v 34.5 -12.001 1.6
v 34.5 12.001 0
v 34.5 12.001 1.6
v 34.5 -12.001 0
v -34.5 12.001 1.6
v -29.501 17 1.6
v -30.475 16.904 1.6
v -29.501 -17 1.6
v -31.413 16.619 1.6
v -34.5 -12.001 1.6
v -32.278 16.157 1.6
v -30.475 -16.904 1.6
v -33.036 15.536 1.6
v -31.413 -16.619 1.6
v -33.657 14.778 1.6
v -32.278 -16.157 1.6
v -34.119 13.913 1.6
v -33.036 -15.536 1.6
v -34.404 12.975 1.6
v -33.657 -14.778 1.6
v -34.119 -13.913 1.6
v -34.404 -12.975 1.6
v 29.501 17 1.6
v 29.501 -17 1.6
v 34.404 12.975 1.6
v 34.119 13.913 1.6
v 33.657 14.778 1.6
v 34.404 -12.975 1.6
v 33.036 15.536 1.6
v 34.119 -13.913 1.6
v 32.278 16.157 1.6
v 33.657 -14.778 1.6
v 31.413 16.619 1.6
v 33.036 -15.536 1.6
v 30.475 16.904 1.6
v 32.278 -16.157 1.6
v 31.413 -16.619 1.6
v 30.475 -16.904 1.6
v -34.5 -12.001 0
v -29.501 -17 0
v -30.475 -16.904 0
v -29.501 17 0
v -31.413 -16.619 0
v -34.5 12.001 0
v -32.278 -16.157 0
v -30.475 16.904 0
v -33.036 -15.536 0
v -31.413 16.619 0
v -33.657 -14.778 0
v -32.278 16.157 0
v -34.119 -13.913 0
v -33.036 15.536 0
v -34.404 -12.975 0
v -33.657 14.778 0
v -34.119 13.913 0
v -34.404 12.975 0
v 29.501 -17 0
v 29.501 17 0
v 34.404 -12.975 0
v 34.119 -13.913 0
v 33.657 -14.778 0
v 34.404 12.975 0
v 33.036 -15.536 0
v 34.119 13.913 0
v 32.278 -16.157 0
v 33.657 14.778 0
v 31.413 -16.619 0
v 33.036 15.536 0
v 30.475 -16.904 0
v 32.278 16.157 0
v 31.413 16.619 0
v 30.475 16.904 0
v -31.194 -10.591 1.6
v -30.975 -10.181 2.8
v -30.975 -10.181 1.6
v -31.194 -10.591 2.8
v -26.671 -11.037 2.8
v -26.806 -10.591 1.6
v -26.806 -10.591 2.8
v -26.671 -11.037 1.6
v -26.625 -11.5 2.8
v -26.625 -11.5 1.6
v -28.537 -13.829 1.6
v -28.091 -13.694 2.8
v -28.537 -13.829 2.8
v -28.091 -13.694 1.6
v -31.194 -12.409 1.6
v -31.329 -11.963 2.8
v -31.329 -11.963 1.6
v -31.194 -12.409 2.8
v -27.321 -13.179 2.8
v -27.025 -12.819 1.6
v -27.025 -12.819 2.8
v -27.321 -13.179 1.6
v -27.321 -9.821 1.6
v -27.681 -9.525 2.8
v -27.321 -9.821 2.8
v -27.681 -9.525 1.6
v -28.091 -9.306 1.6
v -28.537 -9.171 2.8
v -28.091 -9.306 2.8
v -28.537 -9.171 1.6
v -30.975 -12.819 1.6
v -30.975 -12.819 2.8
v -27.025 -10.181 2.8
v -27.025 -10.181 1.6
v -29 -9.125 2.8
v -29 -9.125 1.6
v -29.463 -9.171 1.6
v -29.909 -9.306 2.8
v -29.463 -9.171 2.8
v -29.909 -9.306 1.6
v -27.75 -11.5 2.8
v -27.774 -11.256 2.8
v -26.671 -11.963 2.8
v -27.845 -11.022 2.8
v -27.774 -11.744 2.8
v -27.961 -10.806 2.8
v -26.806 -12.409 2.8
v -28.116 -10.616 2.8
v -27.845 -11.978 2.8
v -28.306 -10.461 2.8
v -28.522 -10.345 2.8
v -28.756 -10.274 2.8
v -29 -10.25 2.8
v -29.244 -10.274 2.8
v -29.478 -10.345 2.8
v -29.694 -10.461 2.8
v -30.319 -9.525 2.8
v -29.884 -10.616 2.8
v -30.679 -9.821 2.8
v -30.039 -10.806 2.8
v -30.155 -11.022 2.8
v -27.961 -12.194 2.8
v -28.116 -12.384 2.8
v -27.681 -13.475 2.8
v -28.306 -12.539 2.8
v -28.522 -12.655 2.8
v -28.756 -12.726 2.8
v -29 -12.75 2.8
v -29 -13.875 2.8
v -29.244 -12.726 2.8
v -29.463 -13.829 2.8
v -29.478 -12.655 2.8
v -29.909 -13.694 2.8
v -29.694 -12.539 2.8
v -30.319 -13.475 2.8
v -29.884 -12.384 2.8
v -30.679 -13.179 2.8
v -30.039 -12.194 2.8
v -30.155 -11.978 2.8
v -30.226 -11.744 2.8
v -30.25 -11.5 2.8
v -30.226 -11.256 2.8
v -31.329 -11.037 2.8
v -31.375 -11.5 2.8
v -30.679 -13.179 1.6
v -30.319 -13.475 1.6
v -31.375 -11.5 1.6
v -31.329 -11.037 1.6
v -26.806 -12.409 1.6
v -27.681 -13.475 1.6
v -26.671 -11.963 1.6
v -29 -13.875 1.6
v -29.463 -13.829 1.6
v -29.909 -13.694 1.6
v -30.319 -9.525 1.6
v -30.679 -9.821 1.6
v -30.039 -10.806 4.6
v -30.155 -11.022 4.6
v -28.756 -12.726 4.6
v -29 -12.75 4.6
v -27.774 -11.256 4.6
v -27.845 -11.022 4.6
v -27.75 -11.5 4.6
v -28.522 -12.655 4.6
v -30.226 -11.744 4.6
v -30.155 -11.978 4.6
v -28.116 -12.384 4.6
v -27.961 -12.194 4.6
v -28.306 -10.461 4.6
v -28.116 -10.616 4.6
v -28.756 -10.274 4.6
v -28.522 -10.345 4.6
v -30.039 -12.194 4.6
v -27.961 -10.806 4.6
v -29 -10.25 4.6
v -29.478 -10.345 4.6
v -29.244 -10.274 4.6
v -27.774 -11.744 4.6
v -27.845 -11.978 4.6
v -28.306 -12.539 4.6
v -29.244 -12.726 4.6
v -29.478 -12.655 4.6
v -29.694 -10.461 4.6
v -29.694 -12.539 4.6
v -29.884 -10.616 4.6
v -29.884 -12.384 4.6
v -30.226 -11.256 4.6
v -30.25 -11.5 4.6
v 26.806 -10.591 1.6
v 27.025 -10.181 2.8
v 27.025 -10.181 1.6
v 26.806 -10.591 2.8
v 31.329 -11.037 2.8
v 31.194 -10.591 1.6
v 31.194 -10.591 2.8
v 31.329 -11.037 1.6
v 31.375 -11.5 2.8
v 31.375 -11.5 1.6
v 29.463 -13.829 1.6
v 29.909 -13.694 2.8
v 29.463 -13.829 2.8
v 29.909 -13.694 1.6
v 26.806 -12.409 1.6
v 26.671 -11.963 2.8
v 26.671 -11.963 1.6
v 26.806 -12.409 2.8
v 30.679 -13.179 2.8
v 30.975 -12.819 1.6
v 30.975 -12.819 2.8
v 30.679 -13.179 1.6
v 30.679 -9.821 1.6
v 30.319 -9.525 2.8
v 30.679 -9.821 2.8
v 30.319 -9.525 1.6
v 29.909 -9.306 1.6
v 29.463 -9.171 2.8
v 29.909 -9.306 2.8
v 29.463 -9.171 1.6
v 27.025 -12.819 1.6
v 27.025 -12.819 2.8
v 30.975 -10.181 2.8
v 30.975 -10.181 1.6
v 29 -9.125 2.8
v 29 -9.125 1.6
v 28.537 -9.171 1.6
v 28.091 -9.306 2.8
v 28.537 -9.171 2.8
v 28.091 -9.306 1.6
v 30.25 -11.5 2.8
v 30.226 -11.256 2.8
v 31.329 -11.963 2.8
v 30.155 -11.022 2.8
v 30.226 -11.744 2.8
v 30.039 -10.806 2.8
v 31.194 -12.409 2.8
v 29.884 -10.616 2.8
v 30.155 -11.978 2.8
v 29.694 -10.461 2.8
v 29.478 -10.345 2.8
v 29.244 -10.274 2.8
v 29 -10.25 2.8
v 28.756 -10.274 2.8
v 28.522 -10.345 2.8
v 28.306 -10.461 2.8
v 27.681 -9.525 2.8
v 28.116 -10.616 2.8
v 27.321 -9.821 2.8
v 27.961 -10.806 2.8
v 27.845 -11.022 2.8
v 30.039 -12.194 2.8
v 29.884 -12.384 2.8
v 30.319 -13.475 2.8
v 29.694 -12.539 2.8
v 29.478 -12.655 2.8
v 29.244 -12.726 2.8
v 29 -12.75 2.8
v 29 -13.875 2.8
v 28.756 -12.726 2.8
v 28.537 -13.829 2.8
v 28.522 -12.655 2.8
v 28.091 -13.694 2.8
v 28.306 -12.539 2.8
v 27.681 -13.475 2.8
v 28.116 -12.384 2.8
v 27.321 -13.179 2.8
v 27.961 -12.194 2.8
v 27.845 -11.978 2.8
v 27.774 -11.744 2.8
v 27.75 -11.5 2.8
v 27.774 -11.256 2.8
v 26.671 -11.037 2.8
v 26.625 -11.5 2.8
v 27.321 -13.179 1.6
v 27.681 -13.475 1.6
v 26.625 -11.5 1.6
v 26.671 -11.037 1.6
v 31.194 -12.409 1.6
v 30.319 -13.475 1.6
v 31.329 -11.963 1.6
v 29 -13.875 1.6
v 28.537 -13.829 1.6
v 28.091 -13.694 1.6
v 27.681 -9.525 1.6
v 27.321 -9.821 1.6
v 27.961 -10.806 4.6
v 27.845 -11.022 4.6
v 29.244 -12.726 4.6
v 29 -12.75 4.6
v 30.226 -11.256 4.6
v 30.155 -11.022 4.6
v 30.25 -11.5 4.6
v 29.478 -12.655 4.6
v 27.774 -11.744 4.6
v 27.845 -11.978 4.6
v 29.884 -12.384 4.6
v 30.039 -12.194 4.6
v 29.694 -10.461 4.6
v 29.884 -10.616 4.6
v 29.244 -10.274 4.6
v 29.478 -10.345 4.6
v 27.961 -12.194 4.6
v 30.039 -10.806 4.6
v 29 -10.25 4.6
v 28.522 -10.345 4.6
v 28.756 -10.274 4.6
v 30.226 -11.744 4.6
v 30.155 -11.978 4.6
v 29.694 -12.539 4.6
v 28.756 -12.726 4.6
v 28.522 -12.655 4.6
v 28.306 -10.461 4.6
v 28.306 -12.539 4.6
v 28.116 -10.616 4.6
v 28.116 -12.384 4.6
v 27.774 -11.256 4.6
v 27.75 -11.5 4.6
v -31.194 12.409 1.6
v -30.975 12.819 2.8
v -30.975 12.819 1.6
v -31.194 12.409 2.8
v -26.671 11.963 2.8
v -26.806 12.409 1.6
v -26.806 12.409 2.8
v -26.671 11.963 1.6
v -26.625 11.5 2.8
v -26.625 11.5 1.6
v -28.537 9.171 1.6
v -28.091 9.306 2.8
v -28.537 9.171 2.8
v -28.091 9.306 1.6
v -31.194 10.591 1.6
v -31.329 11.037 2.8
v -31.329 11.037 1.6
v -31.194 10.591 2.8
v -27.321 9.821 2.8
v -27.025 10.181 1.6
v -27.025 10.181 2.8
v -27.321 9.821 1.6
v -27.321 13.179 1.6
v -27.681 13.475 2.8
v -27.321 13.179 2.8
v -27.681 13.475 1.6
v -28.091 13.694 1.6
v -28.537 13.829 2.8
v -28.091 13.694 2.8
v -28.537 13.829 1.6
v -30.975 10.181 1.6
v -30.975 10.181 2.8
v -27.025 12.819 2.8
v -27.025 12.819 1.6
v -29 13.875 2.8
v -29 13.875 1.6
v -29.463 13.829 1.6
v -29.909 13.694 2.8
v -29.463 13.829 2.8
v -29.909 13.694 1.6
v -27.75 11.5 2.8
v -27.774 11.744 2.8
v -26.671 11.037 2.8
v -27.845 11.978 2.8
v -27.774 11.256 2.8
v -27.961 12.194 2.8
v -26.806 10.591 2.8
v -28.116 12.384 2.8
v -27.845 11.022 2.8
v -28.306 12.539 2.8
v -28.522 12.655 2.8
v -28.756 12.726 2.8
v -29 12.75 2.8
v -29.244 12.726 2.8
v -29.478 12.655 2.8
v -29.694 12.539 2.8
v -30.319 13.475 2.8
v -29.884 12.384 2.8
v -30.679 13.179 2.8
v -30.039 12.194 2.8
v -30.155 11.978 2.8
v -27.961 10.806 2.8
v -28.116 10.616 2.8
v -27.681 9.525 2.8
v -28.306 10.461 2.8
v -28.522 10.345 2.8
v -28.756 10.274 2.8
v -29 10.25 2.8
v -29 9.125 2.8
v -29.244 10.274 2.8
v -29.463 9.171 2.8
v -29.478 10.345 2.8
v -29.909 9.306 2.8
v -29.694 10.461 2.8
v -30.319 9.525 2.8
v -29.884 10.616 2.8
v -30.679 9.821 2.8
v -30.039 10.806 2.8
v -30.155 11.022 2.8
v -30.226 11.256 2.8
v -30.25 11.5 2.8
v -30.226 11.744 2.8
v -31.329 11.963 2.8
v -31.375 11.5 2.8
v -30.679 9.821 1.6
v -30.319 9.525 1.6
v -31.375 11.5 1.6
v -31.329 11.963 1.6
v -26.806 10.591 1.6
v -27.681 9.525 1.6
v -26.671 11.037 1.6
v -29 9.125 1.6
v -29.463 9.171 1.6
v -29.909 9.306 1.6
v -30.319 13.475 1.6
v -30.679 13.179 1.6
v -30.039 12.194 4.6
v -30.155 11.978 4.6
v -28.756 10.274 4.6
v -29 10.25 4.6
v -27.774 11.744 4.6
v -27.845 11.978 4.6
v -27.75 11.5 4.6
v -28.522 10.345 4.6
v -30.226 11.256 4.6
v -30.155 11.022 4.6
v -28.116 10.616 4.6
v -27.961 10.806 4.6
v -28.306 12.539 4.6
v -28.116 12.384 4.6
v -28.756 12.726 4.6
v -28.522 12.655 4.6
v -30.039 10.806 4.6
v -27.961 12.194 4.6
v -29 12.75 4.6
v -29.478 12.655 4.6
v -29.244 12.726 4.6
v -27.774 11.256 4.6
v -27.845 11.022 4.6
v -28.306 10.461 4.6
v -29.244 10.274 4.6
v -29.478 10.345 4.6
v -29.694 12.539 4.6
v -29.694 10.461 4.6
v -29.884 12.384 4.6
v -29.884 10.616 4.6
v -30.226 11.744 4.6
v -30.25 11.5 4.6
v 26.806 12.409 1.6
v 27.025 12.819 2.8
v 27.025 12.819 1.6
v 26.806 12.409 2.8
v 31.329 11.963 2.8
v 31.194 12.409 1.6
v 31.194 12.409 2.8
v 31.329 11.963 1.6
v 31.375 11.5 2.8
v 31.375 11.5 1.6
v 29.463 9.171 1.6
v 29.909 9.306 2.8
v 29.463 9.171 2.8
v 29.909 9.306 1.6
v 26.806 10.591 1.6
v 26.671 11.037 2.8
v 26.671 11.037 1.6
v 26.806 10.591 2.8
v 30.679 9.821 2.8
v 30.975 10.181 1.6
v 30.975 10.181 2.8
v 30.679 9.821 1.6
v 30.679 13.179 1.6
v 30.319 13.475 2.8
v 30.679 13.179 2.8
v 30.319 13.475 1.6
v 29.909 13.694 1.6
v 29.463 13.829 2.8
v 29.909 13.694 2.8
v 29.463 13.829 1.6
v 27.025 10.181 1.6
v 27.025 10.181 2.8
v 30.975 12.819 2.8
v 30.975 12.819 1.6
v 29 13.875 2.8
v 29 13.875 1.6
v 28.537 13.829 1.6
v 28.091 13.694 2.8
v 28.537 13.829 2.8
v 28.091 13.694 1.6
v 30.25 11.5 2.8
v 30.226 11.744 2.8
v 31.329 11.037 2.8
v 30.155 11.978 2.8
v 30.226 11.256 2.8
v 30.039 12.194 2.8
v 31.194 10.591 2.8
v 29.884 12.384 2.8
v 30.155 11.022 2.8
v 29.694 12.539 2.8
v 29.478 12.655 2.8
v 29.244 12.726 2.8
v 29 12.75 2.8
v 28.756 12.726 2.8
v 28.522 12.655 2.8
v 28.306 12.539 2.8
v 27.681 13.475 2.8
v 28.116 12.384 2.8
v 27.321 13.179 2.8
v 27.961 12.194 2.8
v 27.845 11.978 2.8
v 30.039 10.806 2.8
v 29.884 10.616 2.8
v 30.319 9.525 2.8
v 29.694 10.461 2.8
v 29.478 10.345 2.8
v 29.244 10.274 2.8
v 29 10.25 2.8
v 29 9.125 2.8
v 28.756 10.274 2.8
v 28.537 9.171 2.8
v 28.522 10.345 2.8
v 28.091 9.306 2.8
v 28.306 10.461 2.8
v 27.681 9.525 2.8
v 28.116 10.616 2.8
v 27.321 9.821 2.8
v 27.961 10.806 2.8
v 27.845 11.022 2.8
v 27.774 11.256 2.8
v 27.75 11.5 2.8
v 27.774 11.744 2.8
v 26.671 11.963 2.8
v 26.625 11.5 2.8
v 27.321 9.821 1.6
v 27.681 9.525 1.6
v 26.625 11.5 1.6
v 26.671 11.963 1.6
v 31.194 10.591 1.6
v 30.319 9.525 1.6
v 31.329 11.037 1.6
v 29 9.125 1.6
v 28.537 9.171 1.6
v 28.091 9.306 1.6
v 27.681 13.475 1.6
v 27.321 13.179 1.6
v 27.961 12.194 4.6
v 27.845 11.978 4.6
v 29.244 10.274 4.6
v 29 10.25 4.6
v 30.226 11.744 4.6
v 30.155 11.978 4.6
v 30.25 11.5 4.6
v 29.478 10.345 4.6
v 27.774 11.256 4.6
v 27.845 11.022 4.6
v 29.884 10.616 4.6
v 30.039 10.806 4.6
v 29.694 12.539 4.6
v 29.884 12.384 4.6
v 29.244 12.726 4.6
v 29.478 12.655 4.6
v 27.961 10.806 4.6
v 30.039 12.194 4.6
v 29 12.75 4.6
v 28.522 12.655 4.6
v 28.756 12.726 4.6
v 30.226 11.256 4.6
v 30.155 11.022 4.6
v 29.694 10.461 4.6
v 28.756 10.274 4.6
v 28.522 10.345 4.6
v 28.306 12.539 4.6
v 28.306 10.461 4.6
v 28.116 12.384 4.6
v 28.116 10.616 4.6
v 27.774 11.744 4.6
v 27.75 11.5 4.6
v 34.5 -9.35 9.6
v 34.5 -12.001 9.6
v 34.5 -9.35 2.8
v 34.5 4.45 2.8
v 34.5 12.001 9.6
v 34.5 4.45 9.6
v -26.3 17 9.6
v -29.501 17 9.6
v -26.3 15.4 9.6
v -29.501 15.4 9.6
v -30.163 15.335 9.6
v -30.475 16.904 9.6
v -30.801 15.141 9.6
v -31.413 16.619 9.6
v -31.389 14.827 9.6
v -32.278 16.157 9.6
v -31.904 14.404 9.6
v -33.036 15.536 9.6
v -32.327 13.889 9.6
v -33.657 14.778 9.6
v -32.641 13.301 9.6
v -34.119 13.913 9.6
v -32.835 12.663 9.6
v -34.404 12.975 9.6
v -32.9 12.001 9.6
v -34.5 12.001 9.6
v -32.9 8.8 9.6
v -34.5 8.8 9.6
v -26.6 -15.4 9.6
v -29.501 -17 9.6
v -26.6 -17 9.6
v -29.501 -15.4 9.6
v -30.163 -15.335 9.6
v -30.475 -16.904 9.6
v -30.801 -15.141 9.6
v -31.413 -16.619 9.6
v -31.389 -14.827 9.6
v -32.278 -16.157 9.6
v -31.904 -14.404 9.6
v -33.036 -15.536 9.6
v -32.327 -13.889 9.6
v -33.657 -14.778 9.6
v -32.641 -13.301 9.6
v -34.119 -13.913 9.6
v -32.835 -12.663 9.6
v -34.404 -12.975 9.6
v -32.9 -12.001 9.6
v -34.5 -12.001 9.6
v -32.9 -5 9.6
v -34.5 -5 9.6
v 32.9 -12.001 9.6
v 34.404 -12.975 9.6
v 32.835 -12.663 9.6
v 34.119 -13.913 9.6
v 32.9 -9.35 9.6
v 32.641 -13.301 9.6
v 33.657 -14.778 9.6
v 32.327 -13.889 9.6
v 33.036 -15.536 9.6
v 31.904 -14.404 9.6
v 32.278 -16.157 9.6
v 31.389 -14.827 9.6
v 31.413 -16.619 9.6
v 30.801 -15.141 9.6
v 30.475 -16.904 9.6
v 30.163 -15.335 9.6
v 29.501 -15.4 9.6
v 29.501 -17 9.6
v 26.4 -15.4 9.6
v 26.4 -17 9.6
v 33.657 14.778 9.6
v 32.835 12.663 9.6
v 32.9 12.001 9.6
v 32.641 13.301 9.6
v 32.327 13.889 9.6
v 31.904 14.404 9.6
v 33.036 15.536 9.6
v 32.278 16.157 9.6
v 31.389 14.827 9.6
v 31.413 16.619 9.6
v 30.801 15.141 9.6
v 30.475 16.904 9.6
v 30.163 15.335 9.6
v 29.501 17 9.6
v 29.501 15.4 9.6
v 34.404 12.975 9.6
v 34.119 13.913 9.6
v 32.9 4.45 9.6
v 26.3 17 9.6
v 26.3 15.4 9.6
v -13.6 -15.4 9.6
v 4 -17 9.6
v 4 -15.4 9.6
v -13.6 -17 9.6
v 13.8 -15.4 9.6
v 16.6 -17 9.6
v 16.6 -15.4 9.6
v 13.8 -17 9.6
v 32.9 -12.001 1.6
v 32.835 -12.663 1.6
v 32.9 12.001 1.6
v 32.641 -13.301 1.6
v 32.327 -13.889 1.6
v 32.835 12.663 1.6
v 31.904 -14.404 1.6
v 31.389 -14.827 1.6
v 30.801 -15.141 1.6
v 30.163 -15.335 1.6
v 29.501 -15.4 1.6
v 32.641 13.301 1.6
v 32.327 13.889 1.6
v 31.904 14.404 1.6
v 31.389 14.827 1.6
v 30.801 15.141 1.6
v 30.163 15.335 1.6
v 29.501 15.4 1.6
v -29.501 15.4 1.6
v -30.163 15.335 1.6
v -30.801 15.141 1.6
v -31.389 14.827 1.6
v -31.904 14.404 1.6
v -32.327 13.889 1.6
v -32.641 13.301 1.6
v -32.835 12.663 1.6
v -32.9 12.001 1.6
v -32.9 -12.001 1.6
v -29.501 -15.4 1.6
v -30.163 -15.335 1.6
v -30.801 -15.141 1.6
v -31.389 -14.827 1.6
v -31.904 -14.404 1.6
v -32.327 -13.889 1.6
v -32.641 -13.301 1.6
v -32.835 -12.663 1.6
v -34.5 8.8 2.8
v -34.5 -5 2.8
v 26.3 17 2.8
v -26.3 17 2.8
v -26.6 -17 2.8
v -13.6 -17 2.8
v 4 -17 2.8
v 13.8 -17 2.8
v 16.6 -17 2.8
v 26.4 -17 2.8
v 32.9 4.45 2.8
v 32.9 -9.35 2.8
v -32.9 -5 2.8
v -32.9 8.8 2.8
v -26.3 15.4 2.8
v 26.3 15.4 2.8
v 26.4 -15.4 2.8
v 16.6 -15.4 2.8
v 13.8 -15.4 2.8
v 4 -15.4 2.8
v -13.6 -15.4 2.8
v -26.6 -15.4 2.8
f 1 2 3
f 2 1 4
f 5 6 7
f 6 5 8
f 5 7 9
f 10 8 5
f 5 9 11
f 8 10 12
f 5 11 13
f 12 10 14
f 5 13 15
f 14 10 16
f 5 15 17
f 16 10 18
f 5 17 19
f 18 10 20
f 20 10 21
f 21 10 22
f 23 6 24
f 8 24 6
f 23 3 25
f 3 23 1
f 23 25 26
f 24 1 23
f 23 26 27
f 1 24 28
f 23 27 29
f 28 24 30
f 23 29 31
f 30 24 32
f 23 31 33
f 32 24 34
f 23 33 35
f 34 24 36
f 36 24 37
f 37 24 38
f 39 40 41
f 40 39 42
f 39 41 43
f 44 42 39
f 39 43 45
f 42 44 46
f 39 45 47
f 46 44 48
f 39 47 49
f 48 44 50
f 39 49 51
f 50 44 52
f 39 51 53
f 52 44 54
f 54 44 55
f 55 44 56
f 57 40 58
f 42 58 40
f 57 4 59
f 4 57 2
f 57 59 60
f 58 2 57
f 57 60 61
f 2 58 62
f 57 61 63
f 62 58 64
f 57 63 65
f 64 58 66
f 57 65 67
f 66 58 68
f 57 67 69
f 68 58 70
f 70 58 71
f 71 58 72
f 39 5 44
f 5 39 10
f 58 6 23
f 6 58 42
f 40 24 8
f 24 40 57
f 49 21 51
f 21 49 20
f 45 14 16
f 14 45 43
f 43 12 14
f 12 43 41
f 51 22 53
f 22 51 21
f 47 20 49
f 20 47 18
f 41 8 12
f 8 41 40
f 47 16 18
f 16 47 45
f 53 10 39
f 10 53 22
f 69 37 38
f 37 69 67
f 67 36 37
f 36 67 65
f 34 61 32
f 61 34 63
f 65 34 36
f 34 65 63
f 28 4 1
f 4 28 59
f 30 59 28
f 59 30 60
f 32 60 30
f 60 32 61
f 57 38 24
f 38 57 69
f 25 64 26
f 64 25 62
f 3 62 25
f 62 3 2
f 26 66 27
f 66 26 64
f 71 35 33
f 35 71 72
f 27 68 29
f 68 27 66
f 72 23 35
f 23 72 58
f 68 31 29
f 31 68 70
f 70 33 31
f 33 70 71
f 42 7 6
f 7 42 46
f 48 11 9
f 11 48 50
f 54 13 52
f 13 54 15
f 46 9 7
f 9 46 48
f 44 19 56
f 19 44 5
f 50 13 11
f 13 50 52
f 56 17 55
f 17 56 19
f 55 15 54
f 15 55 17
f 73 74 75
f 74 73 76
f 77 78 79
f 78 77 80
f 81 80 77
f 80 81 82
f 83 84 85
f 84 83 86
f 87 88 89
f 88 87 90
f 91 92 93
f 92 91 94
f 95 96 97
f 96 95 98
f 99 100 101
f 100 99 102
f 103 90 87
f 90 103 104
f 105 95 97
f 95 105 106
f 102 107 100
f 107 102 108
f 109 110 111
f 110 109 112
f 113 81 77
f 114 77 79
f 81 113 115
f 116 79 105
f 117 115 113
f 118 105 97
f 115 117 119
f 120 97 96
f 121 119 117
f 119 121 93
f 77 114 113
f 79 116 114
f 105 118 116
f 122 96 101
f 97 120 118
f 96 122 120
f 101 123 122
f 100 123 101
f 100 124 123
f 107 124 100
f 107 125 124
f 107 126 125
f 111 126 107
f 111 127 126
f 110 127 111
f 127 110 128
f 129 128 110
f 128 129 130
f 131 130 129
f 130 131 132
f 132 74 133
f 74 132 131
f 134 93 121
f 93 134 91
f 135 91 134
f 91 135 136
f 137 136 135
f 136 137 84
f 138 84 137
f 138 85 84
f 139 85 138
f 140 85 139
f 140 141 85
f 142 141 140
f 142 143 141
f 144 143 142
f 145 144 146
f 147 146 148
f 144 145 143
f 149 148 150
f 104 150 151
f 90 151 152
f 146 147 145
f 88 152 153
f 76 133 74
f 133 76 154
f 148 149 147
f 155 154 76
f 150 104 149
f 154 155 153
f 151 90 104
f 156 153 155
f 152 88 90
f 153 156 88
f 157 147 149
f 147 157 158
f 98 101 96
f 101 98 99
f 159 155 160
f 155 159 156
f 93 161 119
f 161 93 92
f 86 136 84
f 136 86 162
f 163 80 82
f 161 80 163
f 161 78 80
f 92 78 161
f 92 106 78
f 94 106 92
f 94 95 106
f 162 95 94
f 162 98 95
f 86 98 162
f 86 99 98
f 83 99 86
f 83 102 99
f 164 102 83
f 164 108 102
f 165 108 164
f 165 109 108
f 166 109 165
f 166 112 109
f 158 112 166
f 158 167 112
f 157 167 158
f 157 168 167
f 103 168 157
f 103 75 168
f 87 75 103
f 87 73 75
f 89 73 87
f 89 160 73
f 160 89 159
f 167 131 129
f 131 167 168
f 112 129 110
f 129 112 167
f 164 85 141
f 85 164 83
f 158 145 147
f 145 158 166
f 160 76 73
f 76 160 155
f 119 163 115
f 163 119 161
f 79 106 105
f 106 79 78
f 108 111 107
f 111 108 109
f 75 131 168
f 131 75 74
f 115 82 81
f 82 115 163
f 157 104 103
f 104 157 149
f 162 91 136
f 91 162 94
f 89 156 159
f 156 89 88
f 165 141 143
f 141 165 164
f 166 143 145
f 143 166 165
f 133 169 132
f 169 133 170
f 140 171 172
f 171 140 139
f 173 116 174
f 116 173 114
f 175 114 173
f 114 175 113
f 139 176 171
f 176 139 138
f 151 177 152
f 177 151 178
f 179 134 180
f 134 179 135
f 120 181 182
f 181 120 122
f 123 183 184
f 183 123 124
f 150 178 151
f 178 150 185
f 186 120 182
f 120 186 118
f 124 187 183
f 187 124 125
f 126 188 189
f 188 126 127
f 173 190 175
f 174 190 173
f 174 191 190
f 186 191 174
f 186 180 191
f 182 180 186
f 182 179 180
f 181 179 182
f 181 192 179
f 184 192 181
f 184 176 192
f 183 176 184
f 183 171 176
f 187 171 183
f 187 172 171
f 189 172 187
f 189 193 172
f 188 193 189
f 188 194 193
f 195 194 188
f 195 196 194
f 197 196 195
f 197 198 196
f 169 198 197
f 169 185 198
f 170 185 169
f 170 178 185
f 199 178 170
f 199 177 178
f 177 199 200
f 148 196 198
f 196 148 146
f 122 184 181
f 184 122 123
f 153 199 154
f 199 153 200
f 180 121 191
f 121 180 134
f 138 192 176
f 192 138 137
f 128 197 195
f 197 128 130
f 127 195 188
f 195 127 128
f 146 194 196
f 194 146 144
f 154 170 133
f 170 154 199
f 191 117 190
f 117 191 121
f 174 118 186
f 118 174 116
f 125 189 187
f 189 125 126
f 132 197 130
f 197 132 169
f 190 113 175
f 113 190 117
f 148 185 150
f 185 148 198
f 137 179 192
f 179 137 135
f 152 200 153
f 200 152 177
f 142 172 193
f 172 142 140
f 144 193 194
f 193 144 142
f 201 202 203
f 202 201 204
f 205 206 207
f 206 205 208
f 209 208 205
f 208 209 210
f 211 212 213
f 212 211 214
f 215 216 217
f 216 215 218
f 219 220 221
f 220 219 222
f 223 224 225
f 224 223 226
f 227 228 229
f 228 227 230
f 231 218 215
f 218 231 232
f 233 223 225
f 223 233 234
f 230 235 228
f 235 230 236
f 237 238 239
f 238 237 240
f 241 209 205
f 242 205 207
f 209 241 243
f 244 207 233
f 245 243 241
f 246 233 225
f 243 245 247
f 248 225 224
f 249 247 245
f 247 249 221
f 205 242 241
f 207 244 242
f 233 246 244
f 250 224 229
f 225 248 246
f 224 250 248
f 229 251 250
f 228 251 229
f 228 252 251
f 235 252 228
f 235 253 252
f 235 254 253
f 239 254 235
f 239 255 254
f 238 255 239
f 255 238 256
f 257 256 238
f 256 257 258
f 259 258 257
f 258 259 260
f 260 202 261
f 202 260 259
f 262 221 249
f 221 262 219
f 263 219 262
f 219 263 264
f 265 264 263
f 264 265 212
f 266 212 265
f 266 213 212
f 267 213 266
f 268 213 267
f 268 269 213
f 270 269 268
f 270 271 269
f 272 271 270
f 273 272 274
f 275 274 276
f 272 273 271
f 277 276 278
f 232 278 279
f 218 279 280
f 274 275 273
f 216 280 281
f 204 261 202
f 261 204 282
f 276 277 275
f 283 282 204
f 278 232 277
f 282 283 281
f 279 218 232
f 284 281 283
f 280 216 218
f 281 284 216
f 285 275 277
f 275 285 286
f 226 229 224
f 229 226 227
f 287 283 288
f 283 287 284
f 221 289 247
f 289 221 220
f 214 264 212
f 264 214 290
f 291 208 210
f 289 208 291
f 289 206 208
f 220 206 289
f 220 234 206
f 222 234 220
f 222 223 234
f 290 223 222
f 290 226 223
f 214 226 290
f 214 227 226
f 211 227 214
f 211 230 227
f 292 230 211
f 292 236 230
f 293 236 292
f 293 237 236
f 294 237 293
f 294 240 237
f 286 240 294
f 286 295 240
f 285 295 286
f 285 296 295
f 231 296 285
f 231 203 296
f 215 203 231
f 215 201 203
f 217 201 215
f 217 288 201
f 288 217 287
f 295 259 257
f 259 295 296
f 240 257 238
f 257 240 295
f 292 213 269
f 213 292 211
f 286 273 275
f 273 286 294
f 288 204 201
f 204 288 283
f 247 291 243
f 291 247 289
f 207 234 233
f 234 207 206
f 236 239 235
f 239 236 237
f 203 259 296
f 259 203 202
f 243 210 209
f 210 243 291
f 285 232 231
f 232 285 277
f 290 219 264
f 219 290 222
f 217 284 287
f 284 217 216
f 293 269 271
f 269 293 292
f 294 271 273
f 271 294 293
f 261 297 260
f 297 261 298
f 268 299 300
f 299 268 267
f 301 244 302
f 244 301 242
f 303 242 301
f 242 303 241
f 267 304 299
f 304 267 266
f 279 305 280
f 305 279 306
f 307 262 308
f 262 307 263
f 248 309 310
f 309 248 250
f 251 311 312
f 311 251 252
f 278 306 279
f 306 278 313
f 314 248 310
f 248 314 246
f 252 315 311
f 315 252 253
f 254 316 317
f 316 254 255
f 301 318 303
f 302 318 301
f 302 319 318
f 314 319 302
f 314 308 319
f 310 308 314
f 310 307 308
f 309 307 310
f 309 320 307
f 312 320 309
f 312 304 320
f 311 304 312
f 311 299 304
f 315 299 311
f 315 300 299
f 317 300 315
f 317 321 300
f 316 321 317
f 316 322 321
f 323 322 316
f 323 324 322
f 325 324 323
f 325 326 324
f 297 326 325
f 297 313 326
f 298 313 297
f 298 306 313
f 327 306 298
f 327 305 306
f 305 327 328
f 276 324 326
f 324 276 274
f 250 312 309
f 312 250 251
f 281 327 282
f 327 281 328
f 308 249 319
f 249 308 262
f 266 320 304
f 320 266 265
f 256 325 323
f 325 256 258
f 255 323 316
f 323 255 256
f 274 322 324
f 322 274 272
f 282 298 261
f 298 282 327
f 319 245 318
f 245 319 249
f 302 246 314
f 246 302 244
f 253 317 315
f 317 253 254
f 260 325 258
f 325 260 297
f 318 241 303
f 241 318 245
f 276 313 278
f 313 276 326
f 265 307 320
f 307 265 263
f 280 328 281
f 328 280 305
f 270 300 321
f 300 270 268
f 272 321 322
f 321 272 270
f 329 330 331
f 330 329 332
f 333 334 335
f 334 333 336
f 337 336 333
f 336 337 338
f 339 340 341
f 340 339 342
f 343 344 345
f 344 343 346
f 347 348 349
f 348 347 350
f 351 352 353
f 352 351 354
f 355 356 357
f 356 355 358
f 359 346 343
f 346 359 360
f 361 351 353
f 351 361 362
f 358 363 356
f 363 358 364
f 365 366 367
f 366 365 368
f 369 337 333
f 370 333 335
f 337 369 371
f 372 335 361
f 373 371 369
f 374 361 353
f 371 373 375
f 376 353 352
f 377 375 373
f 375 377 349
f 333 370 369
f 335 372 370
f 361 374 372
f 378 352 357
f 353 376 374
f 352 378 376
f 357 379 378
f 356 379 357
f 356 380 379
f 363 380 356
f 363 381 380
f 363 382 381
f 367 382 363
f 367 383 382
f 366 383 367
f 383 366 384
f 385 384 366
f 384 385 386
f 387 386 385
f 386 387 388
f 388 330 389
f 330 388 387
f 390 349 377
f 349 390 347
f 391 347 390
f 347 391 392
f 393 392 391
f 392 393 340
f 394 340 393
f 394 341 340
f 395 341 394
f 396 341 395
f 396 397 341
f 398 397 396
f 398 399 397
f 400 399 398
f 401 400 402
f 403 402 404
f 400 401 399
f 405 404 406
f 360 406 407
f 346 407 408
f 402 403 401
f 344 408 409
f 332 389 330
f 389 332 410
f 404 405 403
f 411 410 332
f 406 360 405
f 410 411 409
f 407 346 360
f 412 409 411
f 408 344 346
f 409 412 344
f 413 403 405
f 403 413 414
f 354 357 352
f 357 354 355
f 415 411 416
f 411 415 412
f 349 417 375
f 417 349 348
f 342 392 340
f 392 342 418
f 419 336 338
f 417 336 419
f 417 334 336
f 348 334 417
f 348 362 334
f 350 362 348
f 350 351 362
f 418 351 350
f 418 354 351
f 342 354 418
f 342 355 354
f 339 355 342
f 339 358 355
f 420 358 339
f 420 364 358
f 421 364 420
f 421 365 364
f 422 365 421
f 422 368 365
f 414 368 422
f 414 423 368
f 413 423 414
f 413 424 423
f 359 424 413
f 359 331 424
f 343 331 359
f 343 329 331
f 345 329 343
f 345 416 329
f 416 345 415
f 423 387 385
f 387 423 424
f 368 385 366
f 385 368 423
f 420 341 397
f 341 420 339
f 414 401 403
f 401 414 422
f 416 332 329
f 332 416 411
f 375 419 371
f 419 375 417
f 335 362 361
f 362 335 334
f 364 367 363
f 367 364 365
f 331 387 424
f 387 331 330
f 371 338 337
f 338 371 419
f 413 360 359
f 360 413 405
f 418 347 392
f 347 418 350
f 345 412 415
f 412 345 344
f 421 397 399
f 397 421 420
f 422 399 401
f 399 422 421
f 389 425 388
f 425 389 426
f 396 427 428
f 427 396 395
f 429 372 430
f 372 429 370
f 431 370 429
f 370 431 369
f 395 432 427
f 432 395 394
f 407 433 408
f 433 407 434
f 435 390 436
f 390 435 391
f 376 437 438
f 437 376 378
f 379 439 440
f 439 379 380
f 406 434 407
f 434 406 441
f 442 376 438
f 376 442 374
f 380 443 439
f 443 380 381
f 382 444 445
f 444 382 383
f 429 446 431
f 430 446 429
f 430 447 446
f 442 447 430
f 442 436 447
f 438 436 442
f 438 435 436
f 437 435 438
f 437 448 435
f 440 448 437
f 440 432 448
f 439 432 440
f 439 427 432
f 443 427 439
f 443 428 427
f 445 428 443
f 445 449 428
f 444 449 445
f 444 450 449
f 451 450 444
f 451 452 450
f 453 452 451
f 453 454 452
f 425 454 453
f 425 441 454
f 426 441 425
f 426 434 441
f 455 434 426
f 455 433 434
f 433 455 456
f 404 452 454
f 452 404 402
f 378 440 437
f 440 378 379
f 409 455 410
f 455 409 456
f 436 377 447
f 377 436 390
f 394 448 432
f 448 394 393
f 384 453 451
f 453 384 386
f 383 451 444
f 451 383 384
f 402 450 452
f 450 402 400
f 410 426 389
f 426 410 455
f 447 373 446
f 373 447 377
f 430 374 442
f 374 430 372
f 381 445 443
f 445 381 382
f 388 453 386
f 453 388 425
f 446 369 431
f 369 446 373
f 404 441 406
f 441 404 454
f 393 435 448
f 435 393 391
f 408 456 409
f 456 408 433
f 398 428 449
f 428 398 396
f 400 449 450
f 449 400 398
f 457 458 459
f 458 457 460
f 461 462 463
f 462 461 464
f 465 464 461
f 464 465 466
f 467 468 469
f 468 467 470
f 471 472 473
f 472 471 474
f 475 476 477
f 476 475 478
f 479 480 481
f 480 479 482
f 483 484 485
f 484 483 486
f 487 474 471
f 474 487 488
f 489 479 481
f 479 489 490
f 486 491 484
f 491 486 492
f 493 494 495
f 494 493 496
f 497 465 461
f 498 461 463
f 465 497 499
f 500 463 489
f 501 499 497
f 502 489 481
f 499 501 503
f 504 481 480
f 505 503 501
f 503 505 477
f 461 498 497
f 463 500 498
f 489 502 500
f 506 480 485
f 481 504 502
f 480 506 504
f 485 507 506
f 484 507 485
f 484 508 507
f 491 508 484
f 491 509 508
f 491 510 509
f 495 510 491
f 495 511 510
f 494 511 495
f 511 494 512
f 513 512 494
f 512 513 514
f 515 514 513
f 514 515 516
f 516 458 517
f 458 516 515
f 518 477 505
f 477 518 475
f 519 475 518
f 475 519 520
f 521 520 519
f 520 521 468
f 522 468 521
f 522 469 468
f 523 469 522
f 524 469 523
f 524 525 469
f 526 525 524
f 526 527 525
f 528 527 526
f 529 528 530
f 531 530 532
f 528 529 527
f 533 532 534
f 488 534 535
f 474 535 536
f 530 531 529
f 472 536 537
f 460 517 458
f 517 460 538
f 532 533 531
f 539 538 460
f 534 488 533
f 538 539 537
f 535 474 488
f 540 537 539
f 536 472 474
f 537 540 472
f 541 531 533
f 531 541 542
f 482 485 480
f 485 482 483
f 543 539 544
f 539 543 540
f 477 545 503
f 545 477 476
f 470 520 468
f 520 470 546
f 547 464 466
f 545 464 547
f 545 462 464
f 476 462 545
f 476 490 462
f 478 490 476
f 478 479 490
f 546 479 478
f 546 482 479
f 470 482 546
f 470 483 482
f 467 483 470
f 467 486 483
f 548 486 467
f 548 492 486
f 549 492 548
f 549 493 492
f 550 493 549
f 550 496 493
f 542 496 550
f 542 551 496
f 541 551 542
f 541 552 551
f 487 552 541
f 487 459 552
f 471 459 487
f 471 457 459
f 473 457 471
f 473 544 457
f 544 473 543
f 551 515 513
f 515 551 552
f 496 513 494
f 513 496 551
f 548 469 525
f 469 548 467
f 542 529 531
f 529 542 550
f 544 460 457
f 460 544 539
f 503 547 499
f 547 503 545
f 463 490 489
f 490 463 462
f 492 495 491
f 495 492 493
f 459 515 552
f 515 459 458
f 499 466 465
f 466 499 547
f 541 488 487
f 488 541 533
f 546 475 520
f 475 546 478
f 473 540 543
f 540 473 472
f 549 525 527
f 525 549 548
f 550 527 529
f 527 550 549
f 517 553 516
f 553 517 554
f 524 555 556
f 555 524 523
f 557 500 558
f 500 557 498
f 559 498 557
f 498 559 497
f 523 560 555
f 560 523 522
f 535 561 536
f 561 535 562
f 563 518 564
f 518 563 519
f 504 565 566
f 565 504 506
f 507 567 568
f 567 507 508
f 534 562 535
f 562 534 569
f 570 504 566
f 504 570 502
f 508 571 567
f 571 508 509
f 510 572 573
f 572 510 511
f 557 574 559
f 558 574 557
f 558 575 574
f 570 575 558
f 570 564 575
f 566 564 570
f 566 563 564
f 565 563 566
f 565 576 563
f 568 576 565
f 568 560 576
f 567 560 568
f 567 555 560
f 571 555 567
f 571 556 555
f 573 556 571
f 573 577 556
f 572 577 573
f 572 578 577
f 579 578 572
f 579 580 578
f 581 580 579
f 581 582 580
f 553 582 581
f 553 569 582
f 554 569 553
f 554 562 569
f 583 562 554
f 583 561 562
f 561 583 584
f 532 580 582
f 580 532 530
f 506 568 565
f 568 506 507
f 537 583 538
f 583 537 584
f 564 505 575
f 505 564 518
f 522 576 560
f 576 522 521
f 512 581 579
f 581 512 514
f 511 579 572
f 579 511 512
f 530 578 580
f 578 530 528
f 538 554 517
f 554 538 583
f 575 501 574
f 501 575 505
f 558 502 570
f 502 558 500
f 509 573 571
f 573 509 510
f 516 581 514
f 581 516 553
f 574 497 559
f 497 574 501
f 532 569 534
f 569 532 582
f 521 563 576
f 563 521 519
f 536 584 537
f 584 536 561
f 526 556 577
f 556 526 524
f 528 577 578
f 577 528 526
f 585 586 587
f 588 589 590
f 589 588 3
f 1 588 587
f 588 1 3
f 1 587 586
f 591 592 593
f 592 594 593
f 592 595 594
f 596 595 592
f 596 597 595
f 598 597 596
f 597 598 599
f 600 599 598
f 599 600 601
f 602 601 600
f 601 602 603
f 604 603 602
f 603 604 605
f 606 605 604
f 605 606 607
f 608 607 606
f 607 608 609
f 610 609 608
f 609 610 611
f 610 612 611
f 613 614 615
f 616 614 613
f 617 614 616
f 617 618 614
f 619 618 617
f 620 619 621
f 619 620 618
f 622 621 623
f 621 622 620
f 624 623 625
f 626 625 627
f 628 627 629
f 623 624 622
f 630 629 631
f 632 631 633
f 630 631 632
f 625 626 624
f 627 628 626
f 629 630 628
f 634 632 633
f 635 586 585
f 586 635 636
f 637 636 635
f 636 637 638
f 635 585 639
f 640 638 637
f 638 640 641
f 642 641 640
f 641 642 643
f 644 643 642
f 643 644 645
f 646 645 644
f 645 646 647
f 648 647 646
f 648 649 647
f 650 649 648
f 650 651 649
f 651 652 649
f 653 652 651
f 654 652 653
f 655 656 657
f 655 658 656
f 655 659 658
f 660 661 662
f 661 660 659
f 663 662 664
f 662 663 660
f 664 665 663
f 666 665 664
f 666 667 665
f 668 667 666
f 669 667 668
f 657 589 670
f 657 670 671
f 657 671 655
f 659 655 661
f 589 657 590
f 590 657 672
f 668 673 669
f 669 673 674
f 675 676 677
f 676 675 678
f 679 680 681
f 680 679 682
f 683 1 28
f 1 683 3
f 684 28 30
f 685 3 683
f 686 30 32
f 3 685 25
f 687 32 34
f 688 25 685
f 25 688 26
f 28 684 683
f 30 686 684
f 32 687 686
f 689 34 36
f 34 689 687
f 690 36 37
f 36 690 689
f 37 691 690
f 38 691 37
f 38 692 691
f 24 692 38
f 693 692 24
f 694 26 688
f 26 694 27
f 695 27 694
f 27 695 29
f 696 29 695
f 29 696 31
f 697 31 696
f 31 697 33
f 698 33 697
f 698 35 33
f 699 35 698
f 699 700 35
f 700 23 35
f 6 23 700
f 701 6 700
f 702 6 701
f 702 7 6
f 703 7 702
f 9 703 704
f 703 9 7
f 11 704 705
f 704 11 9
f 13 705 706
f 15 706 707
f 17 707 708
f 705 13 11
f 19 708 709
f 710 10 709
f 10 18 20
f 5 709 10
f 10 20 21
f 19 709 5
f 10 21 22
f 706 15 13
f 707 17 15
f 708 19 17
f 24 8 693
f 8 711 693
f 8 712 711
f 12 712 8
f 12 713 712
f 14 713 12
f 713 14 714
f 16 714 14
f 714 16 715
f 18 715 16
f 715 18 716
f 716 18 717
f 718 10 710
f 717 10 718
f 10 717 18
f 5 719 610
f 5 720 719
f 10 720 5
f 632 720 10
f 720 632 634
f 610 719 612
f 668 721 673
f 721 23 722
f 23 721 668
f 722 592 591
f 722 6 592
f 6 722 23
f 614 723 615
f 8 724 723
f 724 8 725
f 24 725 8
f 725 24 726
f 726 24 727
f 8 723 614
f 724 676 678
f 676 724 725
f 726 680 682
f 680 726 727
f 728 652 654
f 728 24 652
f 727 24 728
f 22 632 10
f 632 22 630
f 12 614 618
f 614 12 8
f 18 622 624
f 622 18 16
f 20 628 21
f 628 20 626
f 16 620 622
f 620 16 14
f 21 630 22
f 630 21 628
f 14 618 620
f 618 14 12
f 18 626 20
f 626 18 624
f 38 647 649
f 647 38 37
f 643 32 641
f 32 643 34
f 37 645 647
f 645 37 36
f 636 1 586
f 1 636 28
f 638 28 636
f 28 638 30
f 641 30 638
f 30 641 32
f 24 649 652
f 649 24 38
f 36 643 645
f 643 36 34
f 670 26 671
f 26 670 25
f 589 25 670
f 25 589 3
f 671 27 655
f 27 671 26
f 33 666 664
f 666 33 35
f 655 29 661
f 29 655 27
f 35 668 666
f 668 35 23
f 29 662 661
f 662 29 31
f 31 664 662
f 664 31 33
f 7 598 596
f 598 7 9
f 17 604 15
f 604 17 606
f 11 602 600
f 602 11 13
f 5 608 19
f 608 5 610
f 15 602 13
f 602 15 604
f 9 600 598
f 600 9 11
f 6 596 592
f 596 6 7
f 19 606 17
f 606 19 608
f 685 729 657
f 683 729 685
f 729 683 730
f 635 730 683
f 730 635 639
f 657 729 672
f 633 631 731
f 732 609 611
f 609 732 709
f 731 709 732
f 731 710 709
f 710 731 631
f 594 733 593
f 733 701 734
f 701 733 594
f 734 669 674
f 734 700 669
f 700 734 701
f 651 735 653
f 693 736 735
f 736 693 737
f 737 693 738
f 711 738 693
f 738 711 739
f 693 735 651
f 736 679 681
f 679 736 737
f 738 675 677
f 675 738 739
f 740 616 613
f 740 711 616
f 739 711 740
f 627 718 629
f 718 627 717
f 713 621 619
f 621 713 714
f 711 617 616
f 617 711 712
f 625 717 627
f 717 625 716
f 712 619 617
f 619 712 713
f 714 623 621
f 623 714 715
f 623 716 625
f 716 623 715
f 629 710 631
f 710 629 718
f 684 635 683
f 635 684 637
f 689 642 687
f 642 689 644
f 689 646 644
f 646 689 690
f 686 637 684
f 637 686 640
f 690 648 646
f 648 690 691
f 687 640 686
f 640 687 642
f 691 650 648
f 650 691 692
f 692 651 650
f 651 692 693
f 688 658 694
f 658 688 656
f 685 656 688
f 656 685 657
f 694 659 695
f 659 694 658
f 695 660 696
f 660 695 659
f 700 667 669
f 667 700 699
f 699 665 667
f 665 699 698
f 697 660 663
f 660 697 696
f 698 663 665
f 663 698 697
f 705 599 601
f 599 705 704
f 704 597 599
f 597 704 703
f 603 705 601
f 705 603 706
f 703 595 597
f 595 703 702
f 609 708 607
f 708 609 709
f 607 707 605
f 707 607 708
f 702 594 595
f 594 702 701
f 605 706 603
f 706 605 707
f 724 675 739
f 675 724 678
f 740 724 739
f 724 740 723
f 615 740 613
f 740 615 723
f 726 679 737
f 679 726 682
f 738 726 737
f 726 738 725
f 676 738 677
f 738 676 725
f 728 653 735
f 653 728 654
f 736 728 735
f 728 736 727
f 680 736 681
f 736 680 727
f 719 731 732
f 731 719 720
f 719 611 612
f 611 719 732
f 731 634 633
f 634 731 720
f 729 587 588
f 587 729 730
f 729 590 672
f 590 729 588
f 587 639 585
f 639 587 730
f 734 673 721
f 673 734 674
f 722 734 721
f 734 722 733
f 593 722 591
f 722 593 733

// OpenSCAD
$fn = 32;

pzCirBrdDim = [65,30,1.2]; // pi zero circuit board dim
pzStdOffOffset = 3.5; // pi zero stand off hole center offset
pzStdOffDia = 2.75; // pi zero stand off hole diameter
pzCnrRad = 3.0;

wallThickness = 1.6;   // Case wall thickness
bottomThickness = 1.6; // Case botton thickness
topThickness = 1.6;    // Case top thickness
standoffHeight = 1.2;  // Case standoff height
gap = 0.4;             // Gap between pi and inside walls
wallHeight = 8;       // Height off wall not counting bottom

connectorDim = [50.6,5,2.3]; // Connector for pins

//drawRpi();
drawBottom();
drawWalls();

// Calculated globals
bottomDim = [
  pzCirBrdDim[0] + wallThickness * 2 + gap * 2,
  pzCirBrdDim[1] + wallThickness * 2 + gap * 2,
  bottomThickness
];

cornerRadius = pzCnrRad + gap + wallThickness;

module bottom(center = true) {
  d = bottomDim;
  t = center ? [-d[0]/2,-d[1]/2,0] : [0,0,0];
  
  translate(t) {
    rcube(d, r=cornerRadius);
    so = pzStdOffOffset + wallThickness + gap;
    translate([so, so, bottomThickness]) standOff();
    translate([bottomDim[0]-so, so, bottomThickness]) standOff();
    translate([so, bottomDim[1]-so, bottomThickness]) standOff();
    translate([bottomDim[0]-so, bottomDim[1]-so, bottomThickness]) standOff();
  }
}

module standOff() {
  cylinder(d=pzStdOffDia+2, h=standoffHeight);
  cylinder(d=2.5, h=standoffHeight+pzCirBrdDim[2]*1.5);
}

module walls(center = true) {
  d = [bottomDim[0], bottomDim[1], wallHeight];
  t = center ? [-d[0]/2,-d[1]/2,0] : [0,0,0];
  
  translate(t) {
    difference() {
      rcube(d, r=cornerRadius);
      translate([wallThickness, wallThickness, -.01]) 
        rcube([d[0]-wallThickness*2, d[1]-wallThickness*2, d[2]+.02], r=cornerRadius-wallThickness);
      wallCutouts();
    }
    //color("red") wallCutouts();
  }
}

module wallCutouts() {
  hdmiCenterX = 12.4 + wallThickness + gap;
  hdmiWidth = 11.0 + 2;
  usbCenterX = 41.4 + wallThickness + gap;
  usbWidth = 7.8 + 2;
  pwrCenterX = 54.0 + wallThickness + gap;
  pwrWidth = 7.8 + 2;
  sdCenterY = 16.9 + wallThickness + gap;
  sdWidth = 11.8 + 2;
  camCenterY = pzCirBrdDim[1]/2 + wallThickness + gap;
  camWidth = 16.7 + 2;
  pinCenterX = pzCirBrdDim[0]/2 + wallThickness + gap;
  pinWidth = 50.6 + 2;
  
  hdmi = [hdmiWidth, wallThickness+0.2, wallHeight];
  usb = [usbWidth, wallThickness+0.2, wallHeight];
  pwr = usb;
  sd = [wallThickness+0.2, sdWidth, wallHeight];
  pin = [pinWidth, wallThickness+0.2, wallHeight];
  z = standoffHeight;
  
  translate([hdmiCenterX-hdmiWidth/2, -0.1, z]) cube(hdmi);
  translate([usbCenterX-usbWidth/2, -0.1, z]) cube(usb);
  translate([pwrCenterX-pwrWidth/2, -0.1, z]) cube(pwr);
  translate([-0.1, sdCenterY-sdWidth/2, z]) cube(sd);
  translate([bottomDim[0]-wallThickness-0.1, camCenterY-camWidth/2, z]) cube(sd);
  translate([pinCenterX-pinWidth/2, bottomDim[1]-wallThickness-0.1, z]) cube(pin);
}

module rcube(v, r=3) {
  union() {
    difference() {
      cube(v);
      translate([-.001,-.001,-.01]) cube([r,r,v[2]+.02]);
      translate([v[0]-r+.001,-.001,-.01]) cube([r,r,v[2]+.02]);
      translate([v[0]-r+.001,v[1]-r+.001,-.01]) cube([r,r,v[2]+.02]);
      translate([-.001,v[1]-r+.001,-.01]) cube([r,r,v[2]+.02]);
    }
    translate([r,r,0]) cylinder(r=r,h=v[2]);
    translate([v[0]-r,r,0]) cylinder(r=r,h=v[2]);
    translate([v[0]-r,v[1]-r,0]) cylinder(r=r,h=v[2]);
    translate([r,v[1]-r,0]) cylinder(r=r,h=v[2]);
  }
}

module rpi_zero(center=true) {
  d = pzCirBrdDim;
  t = center ? [-d[0]/2,-d[1]/2,0] : [0,0,0];
  off = pzStdOffOffset;
  r = pzStdOffDia/2;
  translate(t) {
    color("green") difference() {
      rcube(d);
      translate([off,off,-.01]) cylinder(r=r,h=d[2]+.02);
      translate([d[0]-off,off,-.01]) cylinder(r=r,h=d[2]+.02);
      translate([d[0]-off,d[1]-off,-.01]) cylinder(r=r,h=d[2]+.02);
      translate([off,d[1]-off,-.01]) cylinder(r=r,h=d[2]+.02);
    }
    translate([0,d[1]+connectorDim[1]/2,0]) pins();
  }
}

module pins() {
  d = pzCirBrdDim;
  cd = connectorDim;
    color("gray") 
      translate([(d[0]-cd[0])/2,0,d[2]]) 
        rotate([90,0,0])
          cube(cd);
}

module drawRpi() {
  z = bottomThickness + standoffHeight;
  translate([0,0,z]) rpi_zero();
}

module drawBottom() {
  bottom();
}

module drawWalls() {
  translate([0,0,bottomThickness]) walls();
};
